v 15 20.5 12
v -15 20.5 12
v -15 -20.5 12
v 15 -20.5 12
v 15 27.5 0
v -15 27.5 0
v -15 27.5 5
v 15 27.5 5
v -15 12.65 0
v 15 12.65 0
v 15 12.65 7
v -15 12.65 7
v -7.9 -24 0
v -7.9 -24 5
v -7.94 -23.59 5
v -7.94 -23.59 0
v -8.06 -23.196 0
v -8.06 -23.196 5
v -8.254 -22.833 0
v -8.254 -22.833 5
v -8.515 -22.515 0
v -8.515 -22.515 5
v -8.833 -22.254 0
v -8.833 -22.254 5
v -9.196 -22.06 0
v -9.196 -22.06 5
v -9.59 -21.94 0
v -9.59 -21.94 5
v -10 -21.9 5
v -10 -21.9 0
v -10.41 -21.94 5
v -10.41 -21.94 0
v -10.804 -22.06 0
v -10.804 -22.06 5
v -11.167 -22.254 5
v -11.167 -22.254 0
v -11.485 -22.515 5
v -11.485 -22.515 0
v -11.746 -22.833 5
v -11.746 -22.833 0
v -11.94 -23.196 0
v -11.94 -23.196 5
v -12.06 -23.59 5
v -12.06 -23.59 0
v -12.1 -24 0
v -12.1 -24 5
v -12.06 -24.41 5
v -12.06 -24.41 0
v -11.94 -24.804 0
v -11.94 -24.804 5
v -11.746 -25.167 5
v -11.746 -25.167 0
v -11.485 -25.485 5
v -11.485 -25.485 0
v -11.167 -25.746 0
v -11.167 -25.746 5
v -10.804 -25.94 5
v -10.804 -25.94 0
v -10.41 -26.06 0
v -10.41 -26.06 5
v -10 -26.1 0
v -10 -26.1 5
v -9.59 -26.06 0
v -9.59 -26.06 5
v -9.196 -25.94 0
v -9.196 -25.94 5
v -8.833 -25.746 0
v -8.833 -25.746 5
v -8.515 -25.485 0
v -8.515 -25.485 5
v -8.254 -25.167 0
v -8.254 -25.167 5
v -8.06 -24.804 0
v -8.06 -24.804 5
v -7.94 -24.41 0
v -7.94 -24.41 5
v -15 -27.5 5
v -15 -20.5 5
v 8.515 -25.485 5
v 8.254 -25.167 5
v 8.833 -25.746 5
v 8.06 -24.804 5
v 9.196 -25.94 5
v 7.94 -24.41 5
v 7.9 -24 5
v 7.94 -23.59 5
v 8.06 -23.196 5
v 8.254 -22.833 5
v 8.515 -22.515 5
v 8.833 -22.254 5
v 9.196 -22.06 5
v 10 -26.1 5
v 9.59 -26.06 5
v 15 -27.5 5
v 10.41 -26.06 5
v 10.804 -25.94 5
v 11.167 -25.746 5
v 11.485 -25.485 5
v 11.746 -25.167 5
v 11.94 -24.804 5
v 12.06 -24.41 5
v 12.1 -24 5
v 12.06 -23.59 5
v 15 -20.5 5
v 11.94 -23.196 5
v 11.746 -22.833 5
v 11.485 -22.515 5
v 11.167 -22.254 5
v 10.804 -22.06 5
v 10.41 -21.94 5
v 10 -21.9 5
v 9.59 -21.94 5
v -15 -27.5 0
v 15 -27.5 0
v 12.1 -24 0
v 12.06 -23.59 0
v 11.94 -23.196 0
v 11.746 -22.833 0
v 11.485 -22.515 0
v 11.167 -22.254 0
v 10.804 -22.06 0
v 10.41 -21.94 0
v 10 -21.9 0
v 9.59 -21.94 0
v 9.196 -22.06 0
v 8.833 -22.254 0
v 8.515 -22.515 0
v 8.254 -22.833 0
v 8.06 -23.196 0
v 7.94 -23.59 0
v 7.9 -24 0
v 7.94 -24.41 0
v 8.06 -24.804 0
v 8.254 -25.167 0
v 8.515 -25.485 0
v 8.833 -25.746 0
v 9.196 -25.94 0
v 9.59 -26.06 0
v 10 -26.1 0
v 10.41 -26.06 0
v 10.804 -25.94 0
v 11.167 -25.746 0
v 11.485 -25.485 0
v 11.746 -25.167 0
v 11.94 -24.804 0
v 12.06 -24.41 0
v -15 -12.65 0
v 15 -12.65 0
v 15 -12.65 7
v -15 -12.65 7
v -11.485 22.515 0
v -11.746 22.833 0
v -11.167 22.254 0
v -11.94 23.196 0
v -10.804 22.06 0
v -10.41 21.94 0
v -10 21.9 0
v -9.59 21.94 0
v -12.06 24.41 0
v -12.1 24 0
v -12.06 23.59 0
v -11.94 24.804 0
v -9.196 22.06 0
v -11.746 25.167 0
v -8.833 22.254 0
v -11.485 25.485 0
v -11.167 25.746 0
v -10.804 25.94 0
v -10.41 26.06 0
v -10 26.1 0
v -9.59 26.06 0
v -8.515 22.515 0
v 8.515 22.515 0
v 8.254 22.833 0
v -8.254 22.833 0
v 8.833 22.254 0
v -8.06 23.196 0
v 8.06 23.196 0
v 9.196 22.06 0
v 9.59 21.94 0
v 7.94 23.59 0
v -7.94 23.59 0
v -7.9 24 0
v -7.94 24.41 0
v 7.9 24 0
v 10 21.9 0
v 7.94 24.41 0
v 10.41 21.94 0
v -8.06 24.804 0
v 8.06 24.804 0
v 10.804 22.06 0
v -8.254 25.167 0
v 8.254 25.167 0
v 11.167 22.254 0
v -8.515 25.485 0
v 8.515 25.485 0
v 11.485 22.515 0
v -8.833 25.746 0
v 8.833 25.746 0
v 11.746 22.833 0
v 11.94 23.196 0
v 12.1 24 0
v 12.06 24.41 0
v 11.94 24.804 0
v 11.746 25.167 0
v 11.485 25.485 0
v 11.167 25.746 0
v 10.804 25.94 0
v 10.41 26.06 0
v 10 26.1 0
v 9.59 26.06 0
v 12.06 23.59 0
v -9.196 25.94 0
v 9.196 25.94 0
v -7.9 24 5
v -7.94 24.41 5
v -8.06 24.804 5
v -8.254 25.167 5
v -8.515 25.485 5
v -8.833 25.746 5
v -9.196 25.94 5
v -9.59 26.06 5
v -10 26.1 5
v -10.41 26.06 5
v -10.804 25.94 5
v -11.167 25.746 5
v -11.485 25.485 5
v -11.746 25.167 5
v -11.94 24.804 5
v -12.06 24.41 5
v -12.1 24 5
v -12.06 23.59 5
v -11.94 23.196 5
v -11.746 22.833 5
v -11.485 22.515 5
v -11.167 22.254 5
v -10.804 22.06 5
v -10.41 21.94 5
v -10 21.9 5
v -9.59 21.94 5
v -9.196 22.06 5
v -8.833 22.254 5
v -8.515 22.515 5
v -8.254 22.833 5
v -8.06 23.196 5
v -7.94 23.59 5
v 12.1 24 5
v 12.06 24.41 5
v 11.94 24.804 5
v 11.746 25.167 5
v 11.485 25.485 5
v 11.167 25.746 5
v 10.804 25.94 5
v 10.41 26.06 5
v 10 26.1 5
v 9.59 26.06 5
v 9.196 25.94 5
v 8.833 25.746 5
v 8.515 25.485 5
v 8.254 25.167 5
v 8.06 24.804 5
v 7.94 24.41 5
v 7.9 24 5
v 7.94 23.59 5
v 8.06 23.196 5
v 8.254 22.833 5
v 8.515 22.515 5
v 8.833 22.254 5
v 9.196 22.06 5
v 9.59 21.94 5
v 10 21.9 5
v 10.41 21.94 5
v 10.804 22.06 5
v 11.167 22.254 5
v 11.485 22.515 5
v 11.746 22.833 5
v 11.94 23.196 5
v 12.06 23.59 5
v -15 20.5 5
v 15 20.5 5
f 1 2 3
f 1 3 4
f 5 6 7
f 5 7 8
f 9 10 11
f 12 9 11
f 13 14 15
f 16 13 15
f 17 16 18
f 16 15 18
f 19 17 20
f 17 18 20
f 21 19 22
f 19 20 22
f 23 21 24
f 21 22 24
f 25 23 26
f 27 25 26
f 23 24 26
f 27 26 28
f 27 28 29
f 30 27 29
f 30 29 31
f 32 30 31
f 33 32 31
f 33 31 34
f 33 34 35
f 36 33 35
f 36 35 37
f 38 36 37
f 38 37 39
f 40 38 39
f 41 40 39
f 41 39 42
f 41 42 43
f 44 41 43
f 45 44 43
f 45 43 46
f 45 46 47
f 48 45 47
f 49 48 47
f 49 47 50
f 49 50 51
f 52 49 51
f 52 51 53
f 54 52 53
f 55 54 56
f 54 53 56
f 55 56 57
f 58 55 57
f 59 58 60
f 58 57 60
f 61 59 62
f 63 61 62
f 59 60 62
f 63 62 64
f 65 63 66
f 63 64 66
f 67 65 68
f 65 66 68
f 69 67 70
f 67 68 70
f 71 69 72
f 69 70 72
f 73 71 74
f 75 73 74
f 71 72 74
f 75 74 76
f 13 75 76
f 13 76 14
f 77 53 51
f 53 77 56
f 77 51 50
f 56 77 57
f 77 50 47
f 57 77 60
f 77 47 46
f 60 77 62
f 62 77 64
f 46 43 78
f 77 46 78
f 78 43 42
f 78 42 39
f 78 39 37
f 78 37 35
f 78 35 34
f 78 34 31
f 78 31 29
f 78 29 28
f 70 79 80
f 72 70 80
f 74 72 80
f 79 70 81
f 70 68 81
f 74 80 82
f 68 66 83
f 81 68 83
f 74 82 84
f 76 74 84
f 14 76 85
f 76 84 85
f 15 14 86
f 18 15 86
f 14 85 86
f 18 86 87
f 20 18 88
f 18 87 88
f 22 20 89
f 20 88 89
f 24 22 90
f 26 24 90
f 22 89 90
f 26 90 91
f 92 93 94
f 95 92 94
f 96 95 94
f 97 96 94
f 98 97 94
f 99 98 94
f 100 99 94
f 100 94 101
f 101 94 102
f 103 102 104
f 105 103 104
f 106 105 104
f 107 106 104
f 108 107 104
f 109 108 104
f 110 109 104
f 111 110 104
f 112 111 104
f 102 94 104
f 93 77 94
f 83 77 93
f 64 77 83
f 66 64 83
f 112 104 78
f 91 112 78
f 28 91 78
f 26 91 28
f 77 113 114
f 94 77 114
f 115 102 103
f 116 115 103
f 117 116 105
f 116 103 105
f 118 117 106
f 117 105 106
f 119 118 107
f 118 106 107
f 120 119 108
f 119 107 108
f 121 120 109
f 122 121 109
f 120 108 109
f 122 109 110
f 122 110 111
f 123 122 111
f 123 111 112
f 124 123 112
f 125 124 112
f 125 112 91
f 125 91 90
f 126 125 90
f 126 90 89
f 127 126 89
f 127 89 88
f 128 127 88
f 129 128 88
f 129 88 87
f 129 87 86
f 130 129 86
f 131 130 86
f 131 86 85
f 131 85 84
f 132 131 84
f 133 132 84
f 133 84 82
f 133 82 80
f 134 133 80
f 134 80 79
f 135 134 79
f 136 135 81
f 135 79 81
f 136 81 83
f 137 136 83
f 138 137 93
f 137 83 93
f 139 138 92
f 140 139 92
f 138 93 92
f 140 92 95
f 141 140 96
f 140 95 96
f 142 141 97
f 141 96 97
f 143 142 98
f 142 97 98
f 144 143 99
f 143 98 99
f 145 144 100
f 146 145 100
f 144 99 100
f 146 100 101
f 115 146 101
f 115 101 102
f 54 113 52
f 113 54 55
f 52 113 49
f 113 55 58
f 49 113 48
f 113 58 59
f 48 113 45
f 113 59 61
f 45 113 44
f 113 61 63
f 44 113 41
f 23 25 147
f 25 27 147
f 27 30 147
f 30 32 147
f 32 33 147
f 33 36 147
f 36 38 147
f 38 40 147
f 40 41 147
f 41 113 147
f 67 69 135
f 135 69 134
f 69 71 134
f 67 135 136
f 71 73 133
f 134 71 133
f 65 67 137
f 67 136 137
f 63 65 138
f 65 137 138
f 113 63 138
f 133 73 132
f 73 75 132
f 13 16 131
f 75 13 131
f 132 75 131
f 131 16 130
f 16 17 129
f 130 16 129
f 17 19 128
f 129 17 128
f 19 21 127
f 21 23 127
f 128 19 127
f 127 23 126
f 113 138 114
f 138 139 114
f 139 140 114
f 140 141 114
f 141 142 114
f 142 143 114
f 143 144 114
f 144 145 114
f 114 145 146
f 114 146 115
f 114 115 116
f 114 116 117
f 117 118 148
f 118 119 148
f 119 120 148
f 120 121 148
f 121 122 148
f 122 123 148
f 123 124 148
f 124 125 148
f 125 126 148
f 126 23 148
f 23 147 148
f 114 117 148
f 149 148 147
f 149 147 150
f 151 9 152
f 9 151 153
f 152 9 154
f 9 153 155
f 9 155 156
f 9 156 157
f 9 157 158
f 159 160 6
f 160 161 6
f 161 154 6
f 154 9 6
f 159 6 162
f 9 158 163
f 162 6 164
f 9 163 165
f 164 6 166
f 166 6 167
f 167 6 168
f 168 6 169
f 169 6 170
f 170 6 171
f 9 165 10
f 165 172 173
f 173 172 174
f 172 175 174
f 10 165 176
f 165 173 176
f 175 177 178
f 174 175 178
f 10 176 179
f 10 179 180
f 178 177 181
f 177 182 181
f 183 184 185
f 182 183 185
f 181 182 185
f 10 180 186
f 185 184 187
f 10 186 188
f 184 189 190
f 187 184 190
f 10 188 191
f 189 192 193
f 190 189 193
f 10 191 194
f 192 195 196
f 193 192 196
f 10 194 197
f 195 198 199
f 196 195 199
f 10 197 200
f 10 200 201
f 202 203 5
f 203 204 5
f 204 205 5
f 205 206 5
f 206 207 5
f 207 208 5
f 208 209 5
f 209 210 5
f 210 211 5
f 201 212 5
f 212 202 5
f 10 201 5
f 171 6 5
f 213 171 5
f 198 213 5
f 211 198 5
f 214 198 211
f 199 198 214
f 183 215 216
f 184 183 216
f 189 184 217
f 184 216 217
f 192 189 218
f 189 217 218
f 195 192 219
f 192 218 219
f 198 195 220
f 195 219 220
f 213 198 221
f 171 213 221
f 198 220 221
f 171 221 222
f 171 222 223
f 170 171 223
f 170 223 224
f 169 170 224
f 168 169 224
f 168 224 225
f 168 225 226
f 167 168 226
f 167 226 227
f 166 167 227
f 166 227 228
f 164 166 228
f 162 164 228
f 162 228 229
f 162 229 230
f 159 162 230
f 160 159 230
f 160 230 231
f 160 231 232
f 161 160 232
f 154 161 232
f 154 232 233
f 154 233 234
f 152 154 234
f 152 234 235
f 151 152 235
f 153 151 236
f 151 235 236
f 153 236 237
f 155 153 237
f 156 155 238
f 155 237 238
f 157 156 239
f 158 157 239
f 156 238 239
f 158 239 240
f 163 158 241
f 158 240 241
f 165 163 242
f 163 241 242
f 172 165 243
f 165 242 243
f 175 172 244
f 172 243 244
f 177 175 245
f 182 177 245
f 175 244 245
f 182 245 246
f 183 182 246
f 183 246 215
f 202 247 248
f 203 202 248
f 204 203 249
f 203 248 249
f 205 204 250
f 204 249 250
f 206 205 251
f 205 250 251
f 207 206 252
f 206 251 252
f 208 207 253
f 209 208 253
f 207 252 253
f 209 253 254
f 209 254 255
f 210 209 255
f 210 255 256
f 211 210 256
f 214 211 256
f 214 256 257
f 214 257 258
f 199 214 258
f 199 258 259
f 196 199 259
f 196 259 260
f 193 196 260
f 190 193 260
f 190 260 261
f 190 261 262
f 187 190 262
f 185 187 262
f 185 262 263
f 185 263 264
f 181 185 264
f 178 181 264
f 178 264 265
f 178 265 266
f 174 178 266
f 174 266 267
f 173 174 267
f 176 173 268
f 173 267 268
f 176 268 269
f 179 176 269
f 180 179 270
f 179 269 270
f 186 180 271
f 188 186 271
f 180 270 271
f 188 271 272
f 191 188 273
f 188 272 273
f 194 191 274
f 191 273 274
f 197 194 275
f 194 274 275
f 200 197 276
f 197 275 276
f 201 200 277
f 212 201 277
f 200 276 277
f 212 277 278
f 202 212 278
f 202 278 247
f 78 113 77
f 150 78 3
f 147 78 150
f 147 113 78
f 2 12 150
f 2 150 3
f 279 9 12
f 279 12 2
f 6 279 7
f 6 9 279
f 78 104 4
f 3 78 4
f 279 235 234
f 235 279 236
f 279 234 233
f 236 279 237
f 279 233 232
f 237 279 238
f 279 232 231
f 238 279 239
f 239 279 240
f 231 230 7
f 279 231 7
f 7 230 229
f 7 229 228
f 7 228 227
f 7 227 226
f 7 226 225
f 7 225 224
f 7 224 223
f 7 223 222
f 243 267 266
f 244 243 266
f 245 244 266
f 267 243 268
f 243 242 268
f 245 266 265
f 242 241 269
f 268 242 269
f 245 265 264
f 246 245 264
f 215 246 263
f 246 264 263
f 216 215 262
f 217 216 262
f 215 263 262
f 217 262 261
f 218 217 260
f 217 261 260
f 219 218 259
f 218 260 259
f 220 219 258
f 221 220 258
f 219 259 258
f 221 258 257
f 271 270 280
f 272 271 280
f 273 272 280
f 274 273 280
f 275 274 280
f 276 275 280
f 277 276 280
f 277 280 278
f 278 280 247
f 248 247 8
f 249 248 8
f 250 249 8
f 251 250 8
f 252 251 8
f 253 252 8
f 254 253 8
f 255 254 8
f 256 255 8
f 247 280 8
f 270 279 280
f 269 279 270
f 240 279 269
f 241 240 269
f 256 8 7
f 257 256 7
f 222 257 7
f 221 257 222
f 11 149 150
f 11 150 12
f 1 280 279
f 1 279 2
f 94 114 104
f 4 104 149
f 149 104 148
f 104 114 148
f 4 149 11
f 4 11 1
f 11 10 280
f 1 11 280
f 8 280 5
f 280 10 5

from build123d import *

# Parameters (mm, degrees)
F0_W      = 30
F0_H      = 55
F1_DEPTH  = 12
F3_W      = 25.3
F3_H      = 14
F4_DEPTH  = 30.001
F5_W      = 7
F5_H      = 7
F6_DEPTH  = 30.001
F7_W      = 7
F7_H      = 7
F8_DEPTH  = 30.001
F10_R     = 2.1
F11_DEPTH = 5.001
F12_R     = 2.1
F13_DEPTH = 5.001


with BuildPart() as f1:
    # F0 (on Top) → F1 (new body)
    with BuildSketch(Plane.XY):
        Rectangle(F0_W, F0_H)
    extrude(amount=F1_DEPTH)

    # F3 (on offset) → F4 (cut, through all)
    with BuildSketch(Plane.YZ.offset(15)):
        Rectangle(F3_W, F3_H)
    extrude(amount=-F4_DEPTH, mode=Mode.SUBTRACT)

    # F5 (on face) → F6 (cut, through all)
    with BuildSketch(Plane.YZ.offset(15)):
        with Locations((-24, 8.5)):
            Rectangle(F5_W, F5_H)
    extrude(amount=-F6_DEPTH, mode=Mode.SUBTRACT)

    # F7 (on face) → F8 (cut, through all)
    with BuildSketch(Plane.YZ.offset(15)):
        with Locations((24, 8.5)):
            Rectangle(F7_W, F7_H)
    extrude(amount=-F8_DEPTH, mode=Mode.SUBTRACT)

    # F10 (on offset) → F11 (cut, through all)
    with BuildSketch(Plane.XY.offset(5)):
        with Locations((-10, 24)):
            Circle(F10_R)
        with Locations((10, 24)):
            Circle(F10_R)
    extrude(amount=-F11_DEPTH, mode=Mode.SUBTRACT)

    # F12 (on face) → F13 (cut, through all)
    with BuildSketch(Plane.XY.offset(5)):
        with Locations((-10, -24)):
            Circle(F12_R)
        with Locations((10, -24)):
            Circle(F12_R)
    extrude(amount=-F13_DEPTH, mode=Mode.SUBTRACT)


solid = f1.part
